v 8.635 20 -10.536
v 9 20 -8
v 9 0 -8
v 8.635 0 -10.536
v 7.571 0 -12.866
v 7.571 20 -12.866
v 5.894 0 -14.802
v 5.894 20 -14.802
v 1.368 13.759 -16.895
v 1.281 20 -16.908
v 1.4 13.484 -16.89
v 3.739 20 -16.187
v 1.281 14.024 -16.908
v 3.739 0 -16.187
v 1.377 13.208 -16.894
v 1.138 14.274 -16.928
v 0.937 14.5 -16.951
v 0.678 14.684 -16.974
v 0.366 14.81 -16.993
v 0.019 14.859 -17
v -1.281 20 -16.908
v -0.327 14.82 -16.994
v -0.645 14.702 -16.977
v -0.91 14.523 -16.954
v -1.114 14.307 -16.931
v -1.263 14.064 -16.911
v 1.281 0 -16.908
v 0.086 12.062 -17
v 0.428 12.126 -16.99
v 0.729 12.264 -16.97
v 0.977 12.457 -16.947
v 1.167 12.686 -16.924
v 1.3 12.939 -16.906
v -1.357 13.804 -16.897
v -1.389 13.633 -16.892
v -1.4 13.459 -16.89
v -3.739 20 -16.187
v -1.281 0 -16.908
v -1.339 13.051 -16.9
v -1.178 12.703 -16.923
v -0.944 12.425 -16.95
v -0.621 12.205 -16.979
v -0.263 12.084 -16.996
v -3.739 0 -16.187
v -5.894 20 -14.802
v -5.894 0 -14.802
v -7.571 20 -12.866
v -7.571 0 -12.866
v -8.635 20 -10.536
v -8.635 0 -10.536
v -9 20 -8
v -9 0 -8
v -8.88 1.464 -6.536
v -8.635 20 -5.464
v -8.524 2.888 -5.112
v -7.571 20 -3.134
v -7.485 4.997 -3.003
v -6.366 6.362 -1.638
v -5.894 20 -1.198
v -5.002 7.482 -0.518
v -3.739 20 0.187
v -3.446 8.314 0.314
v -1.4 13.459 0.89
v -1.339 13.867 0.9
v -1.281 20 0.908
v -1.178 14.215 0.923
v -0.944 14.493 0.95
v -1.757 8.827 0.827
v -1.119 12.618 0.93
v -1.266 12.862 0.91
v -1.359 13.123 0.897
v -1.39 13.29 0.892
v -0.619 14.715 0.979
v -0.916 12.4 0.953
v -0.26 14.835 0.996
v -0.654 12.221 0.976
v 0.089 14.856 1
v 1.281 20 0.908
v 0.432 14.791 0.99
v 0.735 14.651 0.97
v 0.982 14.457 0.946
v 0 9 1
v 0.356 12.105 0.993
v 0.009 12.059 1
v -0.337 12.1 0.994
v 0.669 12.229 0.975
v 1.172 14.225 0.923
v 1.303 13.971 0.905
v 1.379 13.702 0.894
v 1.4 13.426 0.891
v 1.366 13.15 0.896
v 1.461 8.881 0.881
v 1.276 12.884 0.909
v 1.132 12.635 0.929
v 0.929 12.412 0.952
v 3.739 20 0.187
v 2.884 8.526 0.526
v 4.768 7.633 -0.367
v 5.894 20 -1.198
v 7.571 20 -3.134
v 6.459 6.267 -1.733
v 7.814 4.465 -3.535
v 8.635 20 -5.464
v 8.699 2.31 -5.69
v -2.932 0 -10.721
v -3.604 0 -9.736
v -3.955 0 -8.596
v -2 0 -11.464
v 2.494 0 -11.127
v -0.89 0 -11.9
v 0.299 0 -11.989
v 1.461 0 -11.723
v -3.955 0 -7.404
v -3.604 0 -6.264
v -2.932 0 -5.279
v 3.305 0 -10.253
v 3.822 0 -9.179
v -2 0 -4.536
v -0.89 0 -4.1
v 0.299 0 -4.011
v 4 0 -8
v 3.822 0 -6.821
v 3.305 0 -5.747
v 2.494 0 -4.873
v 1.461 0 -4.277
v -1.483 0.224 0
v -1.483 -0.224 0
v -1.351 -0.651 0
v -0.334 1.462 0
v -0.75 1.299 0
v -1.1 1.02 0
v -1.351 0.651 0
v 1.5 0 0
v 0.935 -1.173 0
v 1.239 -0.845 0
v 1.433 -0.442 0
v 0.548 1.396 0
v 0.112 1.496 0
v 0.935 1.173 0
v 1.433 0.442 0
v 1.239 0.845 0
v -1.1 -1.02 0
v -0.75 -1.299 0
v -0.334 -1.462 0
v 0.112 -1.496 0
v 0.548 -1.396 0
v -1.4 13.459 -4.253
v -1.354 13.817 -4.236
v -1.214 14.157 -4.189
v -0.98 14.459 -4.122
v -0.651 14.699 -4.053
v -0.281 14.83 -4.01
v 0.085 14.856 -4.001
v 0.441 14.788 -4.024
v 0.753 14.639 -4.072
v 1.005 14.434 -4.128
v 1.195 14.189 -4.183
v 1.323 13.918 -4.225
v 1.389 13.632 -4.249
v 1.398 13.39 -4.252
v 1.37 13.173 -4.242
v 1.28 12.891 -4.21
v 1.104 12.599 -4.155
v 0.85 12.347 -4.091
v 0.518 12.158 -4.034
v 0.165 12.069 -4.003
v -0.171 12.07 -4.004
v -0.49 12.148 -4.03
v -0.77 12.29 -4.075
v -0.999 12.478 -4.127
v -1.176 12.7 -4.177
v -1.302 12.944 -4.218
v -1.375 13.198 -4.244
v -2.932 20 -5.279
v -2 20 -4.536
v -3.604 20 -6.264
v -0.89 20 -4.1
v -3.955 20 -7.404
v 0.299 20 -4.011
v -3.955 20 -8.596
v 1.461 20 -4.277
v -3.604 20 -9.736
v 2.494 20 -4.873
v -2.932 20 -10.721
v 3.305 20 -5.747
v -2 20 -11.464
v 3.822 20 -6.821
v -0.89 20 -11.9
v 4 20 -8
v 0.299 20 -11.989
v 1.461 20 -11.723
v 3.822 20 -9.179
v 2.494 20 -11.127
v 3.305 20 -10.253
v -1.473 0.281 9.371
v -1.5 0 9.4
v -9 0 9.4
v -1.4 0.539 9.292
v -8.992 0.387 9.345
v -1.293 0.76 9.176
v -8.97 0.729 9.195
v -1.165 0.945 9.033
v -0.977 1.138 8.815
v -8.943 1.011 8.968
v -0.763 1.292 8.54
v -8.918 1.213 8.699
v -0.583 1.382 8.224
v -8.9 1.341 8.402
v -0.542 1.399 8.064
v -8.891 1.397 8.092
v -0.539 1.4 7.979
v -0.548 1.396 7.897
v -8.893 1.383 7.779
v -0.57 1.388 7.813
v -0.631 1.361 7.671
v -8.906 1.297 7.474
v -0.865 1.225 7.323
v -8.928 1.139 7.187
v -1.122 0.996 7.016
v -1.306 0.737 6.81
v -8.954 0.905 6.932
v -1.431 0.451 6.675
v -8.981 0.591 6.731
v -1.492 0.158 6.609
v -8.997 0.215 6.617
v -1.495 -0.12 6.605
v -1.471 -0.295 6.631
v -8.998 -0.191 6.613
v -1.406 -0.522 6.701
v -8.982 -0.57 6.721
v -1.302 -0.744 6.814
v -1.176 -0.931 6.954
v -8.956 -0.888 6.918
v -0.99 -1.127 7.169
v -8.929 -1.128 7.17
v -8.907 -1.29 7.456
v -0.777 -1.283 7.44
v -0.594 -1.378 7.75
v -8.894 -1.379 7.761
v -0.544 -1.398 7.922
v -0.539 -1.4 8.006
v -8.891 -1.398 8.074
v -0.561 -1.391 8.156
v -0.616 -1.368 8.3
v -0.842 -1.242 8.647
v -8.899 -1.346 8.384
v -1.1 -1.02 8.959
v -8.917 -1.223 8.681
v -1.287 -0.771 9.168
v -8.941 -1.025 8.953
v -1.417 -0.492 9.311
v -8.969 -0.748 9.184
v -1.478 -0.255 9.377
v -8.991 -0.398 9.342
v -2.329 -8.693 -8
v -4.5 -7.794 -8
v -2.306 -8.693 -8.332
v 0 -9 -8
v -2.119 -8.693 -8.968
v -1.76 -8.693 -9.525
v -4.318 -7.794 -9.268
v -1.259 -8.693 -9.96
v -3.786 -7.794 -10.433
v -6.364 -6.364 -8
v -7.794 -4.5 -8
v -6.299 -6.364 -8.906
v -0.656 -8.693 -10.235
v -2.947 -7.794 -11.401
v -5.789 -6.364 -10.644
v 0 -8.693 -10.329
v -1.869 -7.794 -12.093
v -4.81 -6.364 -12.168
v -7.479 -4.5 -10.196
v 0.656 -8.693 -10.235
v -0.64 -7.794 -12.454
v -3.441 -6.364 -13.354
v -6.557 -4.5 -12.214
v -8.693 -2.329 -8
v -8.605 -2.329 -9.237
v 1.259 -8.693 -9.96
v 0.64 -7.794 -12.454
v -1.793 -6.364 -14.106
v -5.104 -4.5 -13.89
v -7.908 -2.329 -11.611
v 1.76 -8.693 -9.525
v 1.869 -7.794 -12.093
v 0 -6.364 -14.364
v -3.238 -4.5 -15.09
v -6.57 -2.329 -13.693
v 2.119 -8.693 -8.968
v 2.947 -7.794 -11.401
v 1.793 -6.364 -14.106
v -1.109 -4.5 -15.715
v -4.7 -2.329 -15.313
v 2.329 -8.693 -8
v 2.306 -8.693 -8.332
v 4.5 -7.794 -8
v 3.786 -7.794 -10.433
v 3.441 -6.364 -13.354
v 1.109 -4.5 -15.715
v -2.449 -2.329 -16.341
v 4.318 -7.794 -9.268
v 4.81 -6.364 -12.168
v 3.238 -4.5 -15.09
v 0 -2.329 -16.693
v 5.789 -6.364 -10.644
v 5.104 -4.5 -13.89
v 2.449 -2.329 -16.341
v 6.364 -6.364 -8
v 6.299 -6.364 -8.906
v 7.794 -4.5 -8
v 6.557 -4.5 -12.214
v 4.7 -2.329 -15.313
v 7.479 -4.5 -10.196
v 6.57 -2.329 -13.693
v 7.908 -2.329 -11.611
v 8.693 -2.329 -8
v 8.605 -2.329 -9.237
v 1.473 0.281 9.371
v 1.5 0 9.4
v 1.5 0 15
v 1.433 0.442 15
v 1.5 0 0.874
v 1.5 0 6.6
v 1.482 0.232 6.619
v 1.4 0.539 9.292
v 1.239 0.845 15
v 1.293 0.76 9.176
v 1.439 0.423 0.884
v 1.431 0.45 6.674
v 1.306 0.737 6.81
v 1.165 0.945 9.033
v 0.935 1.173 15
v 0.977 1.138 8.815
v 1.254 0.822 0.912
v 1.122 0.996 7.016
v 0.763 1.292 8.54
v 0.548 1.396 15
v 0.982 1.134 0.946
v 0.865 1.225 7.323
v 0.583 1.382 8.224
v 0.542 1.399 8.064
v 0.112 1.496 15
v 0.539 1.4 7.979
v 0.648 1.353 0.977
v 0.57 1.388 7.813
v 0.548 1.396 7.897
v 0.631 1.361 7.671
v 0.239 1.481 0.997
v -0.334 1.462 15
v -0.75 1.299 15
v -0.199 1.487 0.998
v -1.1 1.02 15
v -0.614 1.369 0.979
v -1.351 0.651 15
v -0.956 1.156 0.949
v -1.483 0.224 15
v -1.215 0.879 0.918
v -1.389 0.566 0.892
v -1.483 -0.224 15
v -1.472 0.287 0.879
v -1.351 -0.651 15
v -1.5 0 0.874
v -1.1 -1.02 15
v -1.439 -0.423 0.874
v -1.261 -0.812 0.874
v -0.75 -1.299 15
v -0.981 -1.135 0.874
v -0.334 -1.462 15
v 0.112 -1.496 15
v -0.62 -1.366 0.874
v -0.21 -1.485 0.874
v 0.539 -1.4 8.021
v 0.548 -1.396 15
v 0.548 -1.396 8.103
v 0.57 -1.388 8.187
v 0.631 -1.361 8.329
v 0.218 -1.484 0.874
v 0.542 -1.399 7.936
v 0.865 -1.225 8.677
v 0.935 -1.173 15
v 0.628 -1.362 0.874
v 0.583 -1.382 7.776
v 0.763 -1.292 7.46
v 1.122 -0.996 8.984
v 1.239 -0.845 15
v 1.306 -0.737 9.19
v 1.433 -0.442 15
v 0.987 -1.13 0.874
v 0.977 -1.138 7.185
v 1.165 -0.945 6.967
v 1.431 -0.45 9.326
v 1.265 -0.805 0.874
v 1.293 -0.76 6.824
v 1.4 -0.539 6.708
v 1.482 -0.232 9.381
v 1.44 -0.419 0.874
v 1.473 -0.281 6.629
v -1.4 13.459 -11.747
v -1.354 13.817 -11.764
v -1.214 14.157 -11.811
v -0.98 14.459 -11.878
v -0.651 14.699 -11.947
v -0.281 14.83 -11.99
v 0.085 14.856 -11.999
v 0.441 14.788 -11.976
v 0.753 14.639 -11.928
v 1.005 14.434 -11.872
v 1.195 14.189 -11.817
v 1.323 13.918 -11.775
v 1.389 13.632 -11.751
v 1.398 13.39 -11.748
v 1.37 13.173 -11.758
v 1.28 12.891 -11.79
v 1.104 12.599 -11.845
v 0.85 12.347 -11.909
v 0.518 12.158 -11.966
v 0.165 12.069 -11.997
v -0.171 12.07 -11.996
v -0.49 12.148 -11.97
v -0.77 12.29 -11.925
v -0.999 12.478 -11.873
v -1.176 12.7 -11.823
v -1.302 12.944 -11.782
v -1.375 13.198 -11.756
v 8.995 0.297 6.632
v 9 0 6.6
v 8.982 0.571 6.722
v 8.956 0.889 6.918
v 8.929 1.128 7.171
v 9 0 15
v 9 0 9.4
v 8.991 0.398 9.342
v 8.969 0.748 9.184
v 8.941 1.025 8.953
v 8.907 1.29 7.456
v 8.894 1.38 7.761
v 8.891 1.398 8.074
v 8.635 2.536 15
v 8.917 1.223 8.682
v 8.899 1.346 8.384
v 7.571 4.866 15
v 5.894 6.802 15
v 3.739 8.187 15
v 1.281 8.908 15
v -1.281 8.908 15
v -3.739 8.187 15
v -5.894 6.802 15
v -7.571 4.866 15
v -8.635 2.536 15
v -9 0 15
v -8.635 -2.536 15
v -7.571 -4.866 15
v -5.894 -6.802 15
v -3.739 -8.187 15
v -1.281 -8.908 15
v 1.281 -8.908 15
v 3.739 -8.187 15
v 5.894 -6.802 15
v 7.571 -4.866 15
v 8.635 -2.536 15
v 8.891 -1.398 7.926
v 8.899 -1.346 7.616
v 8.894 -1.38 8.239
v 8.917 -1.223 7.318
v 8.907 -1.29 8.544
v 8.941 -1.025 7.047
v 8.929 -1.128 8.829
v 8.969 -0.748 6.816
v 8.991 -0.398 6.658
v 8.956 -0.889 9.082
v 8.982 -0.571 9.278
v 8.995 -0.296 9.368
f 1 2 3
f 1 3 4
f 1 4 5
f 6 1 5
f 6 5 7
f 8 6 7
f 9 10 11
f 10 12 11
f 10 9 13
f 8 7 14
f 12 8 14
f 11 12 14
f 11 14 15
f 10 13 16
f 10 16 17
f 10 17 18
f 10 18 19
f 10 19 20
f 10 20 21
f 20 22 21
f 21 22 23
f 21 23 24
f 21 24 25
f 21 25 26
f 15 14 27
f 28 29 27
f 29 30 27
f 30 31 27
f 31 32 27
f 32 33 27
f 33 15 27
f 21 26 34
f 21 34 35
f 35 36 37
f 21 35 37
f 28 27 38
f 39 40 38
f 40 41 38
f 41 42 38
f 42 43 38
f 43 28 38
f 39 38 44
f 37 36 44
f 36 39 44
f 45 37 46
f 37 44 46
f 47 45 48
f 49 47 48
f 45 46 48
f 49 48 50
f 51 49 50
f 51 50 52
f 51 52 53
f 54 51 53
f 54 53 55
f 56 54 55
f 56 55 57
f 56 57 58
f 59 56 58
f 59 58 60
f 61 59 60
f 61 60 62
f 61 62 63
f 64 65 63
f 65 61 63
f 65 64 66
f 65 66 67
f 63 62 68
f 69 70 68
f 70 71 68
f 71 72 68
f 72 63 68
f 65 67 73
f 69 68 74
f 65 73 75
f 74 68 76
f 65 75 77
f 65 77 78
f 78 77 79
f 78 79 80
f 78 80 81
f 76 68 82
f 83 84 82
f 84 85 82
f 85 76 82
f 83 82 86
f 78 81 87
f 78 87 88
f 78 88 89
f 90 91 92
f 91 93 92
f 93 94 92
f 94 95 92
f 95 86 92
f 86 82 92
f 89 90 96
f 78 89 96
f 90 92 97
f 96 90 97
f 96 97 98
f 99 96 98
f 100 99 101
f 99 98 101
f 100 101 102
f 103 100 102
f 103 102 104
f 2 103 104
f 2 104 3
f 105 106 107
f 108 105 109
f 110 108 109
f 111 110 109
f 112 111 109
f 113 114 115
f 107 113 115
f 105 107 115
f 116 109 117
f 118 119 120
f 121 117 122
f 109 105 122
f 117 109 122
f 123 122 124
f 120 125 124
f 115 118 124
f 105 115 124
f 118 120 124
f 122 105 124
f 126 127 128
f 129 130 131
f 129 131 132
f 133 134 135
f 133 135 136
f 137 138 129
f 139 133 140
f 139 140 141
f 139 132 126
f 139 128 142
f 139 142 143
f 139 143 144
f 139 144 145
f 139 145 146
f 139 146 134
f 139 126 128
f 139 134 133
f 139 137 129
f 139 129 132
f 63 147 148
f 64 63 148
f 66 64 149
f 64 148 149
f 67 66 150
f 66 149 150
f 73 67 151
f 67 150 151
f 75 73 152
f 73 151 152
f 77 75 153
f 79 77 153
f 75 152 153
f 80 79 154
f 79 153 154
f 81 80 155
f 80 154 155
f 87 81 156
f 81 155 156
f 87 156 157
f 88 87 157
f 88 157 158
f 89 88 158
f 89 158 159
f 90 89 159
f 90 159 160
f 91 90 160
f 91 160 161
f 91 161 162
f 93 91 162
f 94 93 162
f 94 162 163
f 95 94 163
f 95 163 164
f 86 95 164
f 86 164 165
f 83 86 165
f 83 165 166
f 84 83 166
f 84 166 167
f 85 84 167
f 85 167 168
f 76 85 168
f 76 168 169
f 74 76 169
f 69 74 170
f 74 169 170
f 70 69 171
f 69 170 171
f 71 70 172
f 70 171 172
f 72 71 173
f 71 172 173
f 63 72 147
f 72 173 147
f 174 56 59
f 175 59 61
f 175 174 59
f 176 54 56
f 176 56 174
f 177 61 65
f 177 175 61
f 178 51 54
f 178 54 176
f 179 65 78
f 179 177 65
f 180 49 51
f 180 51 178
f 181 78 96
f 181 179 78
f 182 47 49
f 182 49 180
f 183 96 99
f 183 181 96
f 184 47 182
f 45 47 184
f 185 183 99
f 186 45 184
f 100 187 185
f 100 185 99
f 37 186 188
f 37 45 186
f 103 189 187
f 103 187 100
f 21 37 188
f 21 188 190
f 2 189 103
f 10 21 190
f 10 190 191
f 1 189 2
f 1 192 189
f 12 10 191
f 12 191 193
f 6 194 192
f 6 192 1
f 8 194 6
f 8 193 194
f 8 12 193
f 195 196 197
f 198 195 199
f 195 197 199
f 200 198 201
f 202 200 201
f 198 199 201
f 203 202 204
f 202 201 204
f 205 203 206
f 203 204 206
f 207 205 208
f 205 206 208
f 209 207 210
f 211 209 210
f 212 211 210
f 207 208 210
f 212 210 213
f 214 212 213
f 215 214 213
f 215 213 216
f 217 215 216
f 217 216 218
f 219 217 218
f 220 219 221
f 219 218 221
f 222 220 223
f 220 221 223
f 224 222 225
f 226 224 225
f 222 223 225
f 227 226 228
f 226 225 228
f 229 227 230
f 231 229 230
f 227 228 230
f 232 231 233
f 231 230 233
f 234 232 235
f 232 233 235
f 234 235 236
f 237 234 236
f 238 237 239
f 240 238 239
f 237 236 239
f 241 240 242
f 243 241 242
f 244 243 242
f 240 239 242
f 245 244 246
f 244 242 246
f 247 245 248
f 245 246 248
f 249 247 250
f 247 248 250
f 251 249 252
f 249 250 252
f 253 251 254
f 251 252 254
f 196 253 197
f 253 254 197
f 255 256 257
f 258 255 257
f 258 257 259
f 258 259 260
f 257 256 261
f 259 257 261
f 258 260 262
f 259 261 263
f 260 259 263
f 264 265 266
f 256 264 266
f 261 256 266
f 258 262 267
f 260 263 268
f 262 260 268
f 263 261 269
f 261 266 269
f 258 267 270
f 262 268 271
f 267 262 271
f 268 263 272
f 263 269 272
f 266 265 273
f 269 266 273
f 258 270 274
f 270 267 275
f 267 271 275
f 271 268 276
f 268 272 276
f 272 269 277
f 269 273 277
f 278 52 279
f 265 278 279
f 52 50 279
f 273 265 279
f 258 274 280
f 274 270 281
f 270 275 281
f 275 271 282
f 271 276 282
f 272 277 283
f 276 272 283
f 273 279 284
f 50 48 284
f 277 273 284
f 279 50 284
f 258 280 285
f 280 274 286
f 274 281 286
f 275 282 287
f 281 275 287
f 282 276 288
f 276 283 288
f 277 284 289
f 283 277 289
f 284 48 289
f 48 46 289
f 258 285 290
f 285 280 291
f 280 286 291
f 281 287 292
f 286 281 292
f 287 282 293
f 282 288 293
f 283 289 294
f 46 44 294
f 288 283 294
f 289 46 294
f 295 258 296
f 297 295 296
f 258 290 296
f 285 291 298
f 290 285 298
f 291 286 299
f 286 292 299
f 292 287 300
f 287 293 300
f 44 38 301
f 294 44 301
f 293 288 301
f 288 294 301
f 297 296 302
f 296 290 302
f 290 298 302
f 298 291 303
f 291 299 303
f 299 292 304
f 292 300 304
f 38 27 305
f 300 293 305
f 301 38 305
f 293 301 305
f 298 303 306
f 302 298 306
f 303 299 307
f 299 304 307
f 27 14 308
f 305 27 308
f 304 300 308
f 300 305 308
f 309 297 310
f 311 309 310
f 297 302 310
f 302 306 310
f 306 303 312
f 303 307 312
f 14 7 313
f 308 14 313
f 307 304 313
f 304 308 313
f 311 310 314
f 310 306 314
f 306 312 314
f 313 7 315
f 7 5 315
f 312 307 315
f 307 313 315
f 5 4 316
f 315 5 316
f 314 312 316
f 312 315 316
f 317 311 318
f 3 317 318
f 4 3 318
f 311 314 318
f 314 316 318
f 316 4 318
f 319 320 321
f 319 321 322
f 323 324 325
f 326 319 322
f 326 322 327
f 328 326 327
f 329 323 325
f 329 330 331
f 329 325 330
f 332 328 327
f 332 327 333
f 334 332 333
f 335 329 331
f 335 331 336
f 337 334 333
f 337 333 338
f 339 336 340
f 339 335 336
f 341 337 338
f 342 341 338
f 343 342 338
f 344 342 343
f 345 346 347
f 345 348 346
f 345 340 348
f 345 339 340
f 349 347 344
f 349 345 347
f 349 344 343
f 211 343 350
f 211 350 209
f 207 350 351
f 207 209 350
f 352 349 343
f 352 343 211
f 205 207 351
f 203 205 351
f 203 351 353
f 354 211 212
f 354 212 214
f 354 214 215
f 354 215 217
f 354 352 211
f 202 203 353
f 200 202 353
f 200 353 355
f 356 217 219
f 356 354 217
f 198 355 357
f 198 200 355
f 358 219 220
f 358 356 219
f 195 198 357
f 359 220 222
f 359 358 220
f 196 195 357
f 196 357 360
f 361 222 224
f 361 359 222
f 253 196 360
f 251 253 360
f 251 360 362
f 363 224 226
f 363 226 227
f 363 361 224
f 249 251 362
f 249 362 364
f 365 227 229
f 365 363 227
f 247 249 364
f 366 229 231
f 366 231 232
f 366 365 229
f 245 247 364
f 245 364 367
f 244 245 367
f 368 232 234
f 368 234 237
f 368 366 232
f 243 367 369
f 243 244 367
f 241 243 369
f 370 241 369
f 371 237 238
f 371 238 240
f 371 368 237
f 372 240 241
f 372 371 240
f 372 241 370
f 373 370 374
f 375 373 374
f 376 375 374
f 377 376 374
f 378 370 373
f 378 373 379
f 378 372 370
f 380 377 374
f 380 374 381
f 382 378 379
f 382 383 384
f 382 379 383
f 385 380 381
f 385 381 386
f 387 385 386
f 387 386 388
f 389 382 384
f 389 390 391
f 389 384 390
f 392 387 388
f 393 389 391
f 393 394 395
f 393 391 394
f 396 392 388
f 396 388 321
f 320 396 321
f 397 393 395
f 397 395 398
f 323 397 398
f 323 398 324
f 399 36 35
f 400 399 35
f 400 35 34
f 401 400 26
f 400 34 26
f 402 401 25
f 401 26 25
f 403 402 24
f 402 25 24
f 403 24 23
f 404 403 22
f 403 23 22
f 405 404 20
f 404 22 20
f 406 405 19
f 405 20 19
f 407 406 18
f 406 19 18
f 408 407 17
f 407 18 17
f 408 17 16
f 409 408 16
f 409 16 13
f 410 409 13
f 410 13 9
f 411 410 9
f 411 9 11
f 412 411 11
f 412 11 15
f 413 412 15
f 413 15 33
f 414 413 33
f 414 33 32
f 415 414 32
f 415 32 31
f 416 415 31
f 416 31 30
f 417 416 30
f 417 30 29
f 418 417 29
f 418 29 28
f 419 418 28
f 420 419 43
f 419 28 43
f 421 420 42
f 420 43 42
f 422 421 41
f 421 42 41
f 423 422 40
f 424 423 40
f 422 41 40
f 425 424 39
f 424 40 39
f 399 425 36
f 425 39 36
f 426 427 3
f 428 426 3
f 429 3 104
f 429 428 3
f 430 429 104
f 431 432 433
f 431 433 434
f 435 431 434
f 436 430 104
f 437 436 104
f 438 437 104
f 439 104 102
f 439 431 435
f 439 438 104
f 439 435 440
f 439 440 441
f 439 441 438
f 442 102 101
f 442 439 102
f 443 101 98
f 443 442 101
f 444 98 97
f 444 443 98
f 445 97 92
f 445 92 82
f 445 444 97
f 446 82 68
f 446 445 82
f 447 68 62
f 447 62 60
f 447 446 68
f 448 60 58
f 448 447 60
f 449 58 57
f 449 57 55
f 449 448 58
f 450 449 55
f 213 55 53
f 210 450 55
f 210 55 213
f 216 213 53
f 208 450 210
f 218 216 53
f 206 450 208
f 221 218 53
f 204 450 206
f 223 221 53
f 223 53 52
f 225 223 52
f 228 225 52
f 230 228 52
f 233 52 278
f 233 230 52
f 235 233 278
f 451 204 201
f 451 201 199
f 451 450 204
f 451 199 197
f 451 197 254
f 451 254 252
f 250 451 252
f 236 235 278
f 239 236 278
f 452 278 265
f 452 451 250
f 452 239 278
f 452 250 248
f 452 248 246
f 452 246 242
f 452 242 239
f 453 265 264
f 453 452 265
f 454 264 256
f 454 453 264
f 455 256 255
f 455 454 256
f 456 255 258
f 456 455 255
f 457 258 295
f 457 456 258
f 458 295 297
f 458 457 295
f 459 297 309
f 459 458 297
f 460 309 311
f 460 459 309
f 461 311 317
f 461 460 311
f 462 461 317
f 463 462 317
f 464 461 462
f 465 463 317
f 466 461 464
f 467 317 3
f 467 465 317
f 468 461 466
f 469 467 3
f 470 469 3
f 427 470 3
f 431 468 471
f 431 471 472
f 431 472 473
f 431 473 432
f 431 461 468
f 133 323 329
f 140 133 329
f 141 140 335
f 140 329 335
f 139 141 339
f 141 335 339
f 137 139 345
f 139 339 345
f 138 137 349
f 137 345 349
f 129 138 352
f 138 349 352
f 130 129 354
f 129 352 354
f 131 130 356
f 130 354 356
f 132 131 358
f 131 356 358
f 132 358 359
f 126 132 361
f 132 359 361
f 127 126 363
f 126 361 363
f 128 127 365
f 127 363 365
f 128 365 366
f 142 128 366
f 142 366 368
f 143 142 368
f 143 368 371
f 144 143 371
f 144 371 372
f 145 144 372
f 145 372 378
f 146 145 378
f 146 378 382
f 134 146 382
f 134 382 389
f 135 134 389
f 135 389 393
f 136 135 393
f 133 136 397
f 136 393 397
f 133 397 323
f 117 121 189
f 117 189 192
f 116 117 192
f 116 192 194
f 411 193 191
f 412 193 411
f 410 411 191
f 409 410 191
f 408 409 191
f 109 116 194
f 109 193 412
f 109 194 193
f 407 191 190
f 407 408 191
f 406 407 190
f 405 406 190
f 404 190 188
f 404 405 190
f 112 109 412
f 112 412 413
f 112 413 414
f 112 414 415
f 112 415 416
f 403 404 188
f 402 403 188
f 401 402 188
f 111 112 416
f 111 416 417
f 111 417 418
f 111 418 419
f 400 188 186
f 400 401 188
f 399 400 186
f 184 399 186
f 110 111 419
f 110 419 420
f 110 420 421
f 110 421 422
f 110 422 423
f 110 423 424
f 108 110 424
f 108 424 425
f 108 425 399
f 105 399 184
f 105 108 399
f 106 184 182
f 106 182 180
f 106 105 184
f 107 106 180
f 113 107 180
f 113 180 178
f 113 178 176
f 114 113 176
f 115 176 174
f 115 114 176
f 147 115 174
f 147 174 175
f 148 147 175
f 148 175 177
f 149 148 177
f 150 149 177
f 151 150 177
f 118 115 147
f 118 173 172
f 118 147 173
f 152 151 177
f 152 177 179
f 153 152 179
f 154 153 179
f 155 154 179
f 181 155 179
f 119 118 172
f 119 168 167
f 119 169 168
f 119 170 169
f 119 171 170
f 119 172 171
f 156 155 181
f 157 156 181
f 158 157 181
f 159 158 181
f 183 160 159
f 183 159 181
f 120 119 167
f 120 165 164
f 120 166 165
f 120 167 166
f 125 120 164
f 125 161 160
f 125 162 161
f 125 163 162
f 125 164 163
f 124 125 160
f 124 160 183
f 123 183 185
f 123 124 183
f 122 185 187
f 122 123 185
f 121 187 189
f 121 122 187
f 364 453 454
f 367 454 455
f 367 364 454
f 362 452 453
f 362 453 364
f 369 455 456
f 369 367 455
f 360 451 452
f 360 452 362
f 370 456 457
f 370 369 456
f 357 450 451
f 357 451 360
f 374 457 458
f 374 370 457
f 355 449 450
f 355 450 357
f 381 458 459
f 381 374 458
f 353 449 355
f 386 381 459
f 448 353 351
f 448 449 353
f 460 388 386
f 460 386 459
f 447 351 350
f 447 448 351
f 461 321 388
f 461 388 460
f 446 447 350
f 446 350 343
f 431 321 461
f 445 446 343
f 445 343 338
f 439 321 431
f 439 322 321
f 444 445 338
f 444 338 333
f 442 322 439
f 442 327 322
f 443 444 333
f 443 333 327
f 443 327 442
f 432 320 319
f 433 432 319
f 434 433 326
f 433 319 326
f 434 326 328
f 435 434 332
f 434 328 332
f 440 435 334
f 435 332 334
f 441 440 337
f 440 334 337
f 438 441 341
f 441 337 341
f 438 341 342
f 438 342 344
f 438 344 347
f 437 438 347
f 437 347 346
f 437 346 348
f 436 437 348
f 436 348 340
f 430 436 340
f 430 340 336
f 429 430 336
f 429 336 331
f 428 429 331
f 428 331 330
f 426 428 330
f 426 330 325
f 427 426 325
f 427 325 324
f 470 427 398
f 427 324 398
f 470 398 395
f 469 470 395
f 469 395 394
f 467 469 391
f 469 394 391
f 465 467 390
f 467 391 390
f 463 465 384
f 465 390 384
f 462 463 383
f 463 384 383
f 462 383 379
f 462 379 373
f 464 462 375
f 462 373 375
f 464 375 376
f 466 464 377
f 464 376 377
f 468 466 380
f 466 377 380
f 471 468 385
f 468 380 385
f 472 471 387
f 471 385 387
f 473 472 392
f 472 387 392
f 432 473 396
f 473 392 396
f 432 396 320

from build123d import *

# Parameters (mm, degrees)
CROQUIS1_R                   = 9
CROQUIS1_R_2                 = 1.5
SALIENTE_EXTRUIR1_DEPTH      = 15
SALIENTE_EXTRUIR1_DEPTH_BACK = 8
CROQUIS2_R                   = 9
CROQUIS2_R_2                 = 4
SALIENTE_EXTRUIR4_DEPTH      = 20
CROQUIS7_R                   = 4
CORTAR_EXTRUIR1_DEPTH        = 20
CROQUIS8_R                   = 1.5
CORTAR_EXTRUIR2_DEPTH        = 15
CROQUIS9_R                   = 1.4
CORTAR_EXTRUIR3_DEPTH        = 19
CROQUIS10_R                  = 1.4
CORTAR_EXTRUIR4_DEPTH        = 1
CORTAR_EXTRUIR4_DEPTH_BACK   = 33.0000001


with BuildPart() as part:
    # Croquis1 → Saliente-Extruir1 (new body, two sides)
    with BuildSketch(Plane.XY) as saliente_extruir1_sk:
        Circle(CROQUIS1_R)
        Circle(CROQUIS1_R_2, mode=Mode.SUBTRACT)
    extrude(amount=SALIENTE_EXTRUIR1_DEPTH)
    extrude(saliente_extruir1_sk.sketch, amount=-SALIENTE_EXTRUIR1_DEPTH_BACK)

    # Croquis2 → Saliente-Extruir4 (add)
    with BuildSketch(Plane(origin=(0, 0, 0), x_dir=(1, 0, 0), z_dir=(0, 1, 0))):
        with Locations((0, 8)):
            Circle(CROQUIS2_R)
        with Locations((0, 8)):
            Circle(CROQUIS2_R_2, mode=Mode.SUBTRACT)
    extrude(amount=SALIENTE_EXTRUIR4_DEPTH)

    # Croquis6 → Revolución4 (revolve)
    with BuildSketch(Plane(origin=(0, 0, -8), x_dir=(-1, 0, 0), z_dir=(0, 0, -1))):
        with BuildLine():
            Line((0, 0), (0, -9))
            ThreePointArc((0, -9), (-6.363961031, -6.363961031), (-9, 0))
            Line((-9, 0), (0, 0))
        make_face()
    revolve(axis=Axis((0, 0, -8), (0, -1, 0)))

    # Croquis7 → Cortar-Extruir1 (cut)
    with BuildSketch(Plane(origin=(0, 20, 0), x_dir=(1, 0, 0), z_dir=(0, 1, 0))):
        with Locations((0, 8)):
            Circle(CROQUIS7_R)
    extrude(amount=-CORTAR_EXTRUIR1_DEPTH, mode=Mode.SUBTRACT)

    # Croquis8 → Cortar-Extruir2 (cut)
    with BuildSketch(Plane.XY.offset(15)):
        Circle(CROQUIS8_R)
    extrude(amount=-CORTAR_EXTRUIR2_DEPTH, mode=Mode.SUBTRACT)

    # Croquis9 → Cortar-Extruir3 (cut, through all)
    with BuildSketch(Plane.ZY.offset(9)):
        with Locations((8, 0)):
            Circle(CROQUIS9_R)
    extrude(amount=-CORTAR_EXTRUIR3_DEPTH, mode=Mode.SUBTRACT)

    # Croquis10 → Cortar-Extruir4 (cut, two sides)
    with BuildSketch(Plane(origin=(0, 0, -17), x_dir=(-1, 0, 0), z_dir=(0, 0, -1))) as cortar_extruir4_sk:
        with Locations((0, 13.459047629)):
            Circle(CROQUIS10_R)
    extrude(amount=CORTAR_EXTRUIR4_DEPTH, mode=Mode.SUBTRACT)
    extrude(cortar_extruir4_sk.sketch, amount=-CORTAR_EXTRUIR4_DEPTH_BACK, mode=Mode.SUBTRACT)


solid = part.part
